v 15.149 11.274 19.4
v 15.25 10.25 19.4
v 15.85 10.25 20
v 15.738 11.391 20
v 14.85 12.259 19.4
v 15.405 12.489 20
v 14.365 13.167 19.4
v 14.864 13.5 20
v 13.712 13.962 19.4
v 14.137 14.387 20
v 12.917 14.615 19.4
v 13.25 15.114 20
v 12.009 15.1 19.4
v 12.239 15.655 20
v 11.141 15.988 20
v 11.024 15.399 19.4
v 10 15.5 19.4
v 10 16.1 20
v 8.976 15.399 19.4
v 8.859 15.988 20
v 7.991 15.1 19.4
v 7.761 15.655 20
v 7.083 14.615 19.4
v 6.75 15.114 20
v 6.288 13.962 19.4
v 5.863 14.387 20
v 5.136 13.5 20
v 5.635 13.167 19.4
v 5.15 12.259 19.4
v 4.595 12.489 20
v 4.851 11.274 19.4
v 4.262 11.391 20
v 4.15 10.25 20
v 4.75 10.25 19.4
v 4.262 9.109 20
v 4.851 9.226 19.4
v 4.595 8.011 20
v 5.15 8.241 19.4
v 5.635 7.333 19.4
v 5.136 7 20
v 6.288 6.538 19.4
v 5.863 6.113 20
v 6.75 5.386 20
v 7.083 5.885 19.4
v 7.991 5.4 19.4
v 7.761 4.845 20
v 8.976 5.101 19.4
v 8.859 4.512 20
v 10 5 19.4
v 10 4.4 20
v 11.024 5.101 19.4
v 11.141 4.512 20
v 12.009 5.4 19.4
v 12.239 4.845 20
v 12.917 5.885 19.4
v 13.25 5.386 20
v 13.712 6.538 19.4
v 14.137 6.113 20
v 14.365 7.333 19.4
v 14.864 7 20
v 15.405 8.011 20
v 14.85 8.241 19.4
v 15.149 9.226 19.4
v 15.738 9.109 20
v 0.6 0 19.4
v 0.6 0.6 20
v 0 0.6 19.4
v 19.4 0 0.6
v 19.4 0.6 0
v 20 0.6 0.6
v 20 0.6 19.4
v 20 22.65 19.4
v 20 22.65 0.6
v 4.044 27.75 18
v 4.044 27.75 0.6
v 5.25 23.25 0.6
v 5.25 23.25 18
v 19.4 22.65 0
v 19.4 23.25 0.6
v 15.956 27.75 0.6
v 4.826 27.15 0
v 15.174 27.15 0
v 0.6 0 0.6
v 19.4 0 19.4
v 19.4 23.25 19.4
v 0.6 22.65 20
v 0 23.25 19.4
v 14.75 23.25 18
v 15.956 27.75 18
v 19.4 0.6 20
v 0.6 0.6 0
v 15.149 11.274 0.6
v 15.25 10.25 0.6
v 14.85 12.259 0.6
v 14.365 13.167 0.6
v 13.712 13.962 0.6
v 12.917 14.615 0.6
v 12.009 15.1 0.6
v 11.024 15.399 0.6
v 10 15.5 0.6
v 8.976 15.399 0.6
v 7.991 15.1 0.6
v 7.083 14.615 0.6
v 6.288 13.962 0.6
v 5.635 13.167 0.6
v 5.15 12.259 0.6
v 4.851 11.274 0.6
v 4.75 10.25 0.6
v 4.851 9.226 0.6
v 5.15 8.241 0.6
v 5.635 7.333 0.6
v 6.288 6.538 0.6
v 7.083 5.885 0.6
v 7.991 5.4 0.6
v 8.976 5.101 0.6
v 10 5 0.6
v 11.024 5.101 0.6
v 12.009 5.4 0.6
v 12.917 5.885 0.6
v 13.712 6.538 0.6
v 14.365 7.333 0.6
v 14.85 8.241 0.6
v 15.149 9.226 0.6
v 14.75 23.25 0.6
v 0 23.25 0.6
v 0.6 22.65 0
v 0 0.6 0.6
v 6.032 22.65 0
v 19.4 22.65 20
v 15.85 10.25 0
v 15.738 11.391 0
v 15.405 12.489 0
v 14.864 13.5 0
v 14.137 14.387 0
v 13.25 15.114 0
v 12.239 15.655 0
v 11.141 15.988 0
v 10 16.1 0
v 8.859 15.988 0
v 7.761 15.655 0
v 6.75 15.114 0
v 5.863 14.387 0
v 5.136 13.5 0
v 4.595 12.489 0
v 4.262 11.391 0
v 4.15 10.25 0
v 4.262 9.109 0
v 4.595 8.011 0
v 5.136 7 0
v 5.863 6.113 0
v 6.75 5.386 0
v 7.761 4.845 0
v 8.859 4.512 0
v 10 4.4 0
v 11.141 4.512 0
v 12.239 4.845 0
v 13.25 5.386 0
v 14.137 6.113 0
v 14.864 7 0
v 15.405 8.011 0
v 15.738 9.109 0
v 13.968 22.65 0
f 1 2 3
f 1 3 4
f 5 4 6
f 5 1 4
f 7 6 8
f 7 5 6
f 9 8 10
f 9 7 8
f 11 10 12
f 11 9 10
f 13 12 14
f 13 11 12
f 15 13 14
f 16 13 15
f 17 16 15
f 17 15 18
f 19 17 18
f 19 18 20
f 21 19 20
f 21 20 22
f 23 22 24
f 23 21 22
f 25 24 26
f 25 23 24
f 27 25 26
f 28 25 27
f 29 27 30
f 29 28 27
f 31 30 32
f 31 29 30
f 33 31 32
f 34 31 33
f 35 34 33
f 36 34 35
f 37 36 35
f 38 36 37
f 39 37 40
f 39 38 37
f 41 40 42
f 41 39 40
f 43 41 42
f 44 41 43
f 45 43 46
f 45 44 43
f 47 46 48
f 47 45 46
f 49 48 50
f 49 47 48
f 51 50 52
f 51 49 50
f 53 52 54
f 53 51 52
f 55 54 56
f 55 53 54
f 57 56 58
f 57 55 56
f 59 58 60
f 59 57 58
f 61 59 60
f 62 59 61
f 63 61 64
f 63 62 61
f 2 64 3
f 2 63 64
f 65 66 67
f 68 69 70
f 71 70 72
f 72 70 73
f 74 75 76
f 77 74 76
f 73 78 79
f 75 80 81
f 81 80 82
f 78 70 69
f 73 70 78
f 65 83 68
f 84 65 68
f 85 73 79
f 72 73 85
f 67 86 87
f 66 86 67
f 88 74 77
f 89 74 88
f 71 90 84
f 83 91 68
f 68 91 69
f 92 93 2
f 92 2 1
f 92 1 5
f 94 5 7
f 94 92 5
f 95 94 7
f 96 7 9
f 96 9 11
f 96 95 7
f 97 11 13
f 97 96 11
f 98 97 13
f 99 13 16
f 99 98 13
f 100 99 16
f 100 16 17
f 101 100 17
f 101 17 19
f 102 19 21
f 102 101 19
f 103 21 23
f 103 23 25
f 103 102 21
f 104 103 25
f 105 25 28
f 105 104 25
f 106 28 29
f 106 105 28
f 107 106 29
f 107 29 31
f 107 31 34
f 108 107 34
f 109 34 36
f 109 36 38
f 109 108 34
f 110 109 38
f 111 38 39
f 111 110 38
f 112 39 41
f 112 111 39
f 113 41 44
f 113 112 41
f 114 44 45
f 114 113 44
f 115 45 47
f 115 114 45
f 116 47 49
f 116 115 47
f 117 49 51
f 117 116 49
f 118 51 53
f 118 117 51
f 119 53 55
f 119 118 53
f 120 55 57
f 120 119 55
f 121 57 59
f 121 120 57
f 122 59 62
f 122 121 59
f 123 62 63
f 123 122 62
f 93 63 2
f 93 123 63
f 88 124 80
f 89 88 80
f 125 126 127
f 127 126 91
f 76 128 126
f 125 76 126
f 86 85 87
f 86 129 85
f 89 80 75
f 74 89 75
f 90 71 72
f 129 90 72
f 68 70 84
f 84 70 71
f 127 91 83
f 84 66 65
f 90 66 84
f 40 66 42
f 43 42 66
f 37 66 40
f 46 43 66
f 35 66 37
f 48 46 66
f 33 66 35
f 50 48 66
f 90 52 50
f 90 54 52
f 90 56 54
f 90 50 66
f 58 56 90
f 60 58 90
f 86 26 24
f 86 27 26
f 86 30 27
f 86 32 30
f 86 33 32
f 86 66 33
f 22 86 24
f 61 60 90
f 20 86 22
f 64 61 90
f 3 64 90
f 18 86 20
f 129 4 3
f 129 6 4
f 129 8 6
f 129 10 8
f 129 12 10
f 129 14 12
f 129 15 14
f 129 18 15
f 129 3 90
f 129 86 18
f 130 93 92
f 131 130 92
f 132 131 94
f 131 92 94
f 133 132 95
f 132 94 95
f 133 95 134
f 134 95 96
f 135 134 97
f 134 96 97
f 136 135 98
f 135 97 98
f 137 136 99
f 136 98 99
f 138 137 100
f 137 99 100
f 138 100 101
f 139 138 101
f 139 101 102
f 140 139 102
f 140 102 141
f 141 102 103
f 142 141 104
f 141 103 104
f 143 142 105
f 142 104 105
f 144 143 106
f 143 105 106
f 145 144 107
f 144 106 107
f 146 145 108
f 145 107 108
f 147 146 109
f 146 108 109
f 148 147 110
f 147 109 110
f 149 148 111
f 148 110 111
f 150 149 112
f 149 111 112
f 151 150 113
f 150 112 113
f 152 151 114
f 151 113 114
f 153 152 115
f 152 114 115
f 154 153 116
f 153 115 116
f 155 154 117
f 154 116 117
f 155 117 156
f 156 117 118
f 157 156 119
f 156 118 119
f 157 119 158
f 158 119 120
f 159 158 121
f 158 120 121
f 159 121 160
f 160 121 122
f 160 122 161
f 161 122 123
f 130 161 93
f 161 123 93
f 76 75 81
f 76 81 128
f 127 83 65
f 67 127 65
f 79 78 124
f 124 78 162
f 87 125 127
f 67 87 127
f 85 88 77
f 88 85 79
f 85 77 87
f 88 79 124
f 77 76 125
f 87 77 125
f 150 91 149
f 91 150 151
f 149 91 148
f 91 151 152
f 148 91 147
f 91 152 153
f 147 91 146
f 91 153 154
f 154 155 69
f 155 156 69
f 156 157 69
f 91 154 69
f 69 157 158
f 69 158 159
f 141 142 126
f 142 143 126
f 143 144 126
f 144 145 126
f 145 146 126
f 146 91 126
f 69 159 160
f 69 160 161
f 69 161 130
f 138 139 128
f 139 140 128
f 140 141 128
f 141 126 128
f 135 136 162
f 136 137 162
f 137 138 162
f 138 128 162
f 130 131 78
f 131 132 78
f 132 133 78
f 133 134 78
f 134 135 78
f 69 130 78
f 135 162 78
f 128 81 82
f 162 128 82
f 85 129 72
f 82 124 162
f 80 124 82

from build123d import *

# Parameters (mm, degrees)
F2_R     = 5.25
F3_DEPTH = 20
F4_DEPTH = 18
F5_SIZE  = 0.6


# Not quite as in the source:
# - a feature names something its author has since deleted; it is built from what else it names


with BuildPart() as f3:
    # F2 (on Top) → F3 (new body)
    with BuildSketch(Plane.XY):
        Polygon((5.25, 23.25), (0, 23.25), (0, 0), (20, 0), (20, 23.25), (14.75, 23.25), align=None)
        with Locations((10, 10.25)):
            Circle(F2_R, mode=Mode.SUBTRACT)
    extrude(amount=F3_DEPTH)

    # F2 (on Top) → F4 (join)
    with BuildSketch(Plane.XY):
        Polygon((4.0442286341, 27.75), (5.25, 23.25), (14.75, 23.25), (15.9557713659, 27.75), align=None)
    extrude(amount=F4_DEPTH)

    # F5
    f5_edges = [f3.edges().sort_by_distance(p)[0] for p in [
        (0, 11.625, 0),
        (10, 0, 0),
        (20, 11.625, 0),
        (17.375, 23.25, 0),
        (15.352886, 25.5, 0),
        (10, 27.75, 0),
        (4.647114, 25.5, 0),
        (2.625, 23.25, 0),
        (4.75, 10.25, 0),
        (10, 23.25, 20),
        (0, 11.625, 20),
        (10, 0, 20),
        (20, 11.625, 20),
        (4.75, 10.25, 20),
        (0, 0, 10),
        (20, 0, 10),
        (20, 23.25, 10),
    ]]
    chamfer(f5_edges, length=F5_SIZE)


solid = f3.part
